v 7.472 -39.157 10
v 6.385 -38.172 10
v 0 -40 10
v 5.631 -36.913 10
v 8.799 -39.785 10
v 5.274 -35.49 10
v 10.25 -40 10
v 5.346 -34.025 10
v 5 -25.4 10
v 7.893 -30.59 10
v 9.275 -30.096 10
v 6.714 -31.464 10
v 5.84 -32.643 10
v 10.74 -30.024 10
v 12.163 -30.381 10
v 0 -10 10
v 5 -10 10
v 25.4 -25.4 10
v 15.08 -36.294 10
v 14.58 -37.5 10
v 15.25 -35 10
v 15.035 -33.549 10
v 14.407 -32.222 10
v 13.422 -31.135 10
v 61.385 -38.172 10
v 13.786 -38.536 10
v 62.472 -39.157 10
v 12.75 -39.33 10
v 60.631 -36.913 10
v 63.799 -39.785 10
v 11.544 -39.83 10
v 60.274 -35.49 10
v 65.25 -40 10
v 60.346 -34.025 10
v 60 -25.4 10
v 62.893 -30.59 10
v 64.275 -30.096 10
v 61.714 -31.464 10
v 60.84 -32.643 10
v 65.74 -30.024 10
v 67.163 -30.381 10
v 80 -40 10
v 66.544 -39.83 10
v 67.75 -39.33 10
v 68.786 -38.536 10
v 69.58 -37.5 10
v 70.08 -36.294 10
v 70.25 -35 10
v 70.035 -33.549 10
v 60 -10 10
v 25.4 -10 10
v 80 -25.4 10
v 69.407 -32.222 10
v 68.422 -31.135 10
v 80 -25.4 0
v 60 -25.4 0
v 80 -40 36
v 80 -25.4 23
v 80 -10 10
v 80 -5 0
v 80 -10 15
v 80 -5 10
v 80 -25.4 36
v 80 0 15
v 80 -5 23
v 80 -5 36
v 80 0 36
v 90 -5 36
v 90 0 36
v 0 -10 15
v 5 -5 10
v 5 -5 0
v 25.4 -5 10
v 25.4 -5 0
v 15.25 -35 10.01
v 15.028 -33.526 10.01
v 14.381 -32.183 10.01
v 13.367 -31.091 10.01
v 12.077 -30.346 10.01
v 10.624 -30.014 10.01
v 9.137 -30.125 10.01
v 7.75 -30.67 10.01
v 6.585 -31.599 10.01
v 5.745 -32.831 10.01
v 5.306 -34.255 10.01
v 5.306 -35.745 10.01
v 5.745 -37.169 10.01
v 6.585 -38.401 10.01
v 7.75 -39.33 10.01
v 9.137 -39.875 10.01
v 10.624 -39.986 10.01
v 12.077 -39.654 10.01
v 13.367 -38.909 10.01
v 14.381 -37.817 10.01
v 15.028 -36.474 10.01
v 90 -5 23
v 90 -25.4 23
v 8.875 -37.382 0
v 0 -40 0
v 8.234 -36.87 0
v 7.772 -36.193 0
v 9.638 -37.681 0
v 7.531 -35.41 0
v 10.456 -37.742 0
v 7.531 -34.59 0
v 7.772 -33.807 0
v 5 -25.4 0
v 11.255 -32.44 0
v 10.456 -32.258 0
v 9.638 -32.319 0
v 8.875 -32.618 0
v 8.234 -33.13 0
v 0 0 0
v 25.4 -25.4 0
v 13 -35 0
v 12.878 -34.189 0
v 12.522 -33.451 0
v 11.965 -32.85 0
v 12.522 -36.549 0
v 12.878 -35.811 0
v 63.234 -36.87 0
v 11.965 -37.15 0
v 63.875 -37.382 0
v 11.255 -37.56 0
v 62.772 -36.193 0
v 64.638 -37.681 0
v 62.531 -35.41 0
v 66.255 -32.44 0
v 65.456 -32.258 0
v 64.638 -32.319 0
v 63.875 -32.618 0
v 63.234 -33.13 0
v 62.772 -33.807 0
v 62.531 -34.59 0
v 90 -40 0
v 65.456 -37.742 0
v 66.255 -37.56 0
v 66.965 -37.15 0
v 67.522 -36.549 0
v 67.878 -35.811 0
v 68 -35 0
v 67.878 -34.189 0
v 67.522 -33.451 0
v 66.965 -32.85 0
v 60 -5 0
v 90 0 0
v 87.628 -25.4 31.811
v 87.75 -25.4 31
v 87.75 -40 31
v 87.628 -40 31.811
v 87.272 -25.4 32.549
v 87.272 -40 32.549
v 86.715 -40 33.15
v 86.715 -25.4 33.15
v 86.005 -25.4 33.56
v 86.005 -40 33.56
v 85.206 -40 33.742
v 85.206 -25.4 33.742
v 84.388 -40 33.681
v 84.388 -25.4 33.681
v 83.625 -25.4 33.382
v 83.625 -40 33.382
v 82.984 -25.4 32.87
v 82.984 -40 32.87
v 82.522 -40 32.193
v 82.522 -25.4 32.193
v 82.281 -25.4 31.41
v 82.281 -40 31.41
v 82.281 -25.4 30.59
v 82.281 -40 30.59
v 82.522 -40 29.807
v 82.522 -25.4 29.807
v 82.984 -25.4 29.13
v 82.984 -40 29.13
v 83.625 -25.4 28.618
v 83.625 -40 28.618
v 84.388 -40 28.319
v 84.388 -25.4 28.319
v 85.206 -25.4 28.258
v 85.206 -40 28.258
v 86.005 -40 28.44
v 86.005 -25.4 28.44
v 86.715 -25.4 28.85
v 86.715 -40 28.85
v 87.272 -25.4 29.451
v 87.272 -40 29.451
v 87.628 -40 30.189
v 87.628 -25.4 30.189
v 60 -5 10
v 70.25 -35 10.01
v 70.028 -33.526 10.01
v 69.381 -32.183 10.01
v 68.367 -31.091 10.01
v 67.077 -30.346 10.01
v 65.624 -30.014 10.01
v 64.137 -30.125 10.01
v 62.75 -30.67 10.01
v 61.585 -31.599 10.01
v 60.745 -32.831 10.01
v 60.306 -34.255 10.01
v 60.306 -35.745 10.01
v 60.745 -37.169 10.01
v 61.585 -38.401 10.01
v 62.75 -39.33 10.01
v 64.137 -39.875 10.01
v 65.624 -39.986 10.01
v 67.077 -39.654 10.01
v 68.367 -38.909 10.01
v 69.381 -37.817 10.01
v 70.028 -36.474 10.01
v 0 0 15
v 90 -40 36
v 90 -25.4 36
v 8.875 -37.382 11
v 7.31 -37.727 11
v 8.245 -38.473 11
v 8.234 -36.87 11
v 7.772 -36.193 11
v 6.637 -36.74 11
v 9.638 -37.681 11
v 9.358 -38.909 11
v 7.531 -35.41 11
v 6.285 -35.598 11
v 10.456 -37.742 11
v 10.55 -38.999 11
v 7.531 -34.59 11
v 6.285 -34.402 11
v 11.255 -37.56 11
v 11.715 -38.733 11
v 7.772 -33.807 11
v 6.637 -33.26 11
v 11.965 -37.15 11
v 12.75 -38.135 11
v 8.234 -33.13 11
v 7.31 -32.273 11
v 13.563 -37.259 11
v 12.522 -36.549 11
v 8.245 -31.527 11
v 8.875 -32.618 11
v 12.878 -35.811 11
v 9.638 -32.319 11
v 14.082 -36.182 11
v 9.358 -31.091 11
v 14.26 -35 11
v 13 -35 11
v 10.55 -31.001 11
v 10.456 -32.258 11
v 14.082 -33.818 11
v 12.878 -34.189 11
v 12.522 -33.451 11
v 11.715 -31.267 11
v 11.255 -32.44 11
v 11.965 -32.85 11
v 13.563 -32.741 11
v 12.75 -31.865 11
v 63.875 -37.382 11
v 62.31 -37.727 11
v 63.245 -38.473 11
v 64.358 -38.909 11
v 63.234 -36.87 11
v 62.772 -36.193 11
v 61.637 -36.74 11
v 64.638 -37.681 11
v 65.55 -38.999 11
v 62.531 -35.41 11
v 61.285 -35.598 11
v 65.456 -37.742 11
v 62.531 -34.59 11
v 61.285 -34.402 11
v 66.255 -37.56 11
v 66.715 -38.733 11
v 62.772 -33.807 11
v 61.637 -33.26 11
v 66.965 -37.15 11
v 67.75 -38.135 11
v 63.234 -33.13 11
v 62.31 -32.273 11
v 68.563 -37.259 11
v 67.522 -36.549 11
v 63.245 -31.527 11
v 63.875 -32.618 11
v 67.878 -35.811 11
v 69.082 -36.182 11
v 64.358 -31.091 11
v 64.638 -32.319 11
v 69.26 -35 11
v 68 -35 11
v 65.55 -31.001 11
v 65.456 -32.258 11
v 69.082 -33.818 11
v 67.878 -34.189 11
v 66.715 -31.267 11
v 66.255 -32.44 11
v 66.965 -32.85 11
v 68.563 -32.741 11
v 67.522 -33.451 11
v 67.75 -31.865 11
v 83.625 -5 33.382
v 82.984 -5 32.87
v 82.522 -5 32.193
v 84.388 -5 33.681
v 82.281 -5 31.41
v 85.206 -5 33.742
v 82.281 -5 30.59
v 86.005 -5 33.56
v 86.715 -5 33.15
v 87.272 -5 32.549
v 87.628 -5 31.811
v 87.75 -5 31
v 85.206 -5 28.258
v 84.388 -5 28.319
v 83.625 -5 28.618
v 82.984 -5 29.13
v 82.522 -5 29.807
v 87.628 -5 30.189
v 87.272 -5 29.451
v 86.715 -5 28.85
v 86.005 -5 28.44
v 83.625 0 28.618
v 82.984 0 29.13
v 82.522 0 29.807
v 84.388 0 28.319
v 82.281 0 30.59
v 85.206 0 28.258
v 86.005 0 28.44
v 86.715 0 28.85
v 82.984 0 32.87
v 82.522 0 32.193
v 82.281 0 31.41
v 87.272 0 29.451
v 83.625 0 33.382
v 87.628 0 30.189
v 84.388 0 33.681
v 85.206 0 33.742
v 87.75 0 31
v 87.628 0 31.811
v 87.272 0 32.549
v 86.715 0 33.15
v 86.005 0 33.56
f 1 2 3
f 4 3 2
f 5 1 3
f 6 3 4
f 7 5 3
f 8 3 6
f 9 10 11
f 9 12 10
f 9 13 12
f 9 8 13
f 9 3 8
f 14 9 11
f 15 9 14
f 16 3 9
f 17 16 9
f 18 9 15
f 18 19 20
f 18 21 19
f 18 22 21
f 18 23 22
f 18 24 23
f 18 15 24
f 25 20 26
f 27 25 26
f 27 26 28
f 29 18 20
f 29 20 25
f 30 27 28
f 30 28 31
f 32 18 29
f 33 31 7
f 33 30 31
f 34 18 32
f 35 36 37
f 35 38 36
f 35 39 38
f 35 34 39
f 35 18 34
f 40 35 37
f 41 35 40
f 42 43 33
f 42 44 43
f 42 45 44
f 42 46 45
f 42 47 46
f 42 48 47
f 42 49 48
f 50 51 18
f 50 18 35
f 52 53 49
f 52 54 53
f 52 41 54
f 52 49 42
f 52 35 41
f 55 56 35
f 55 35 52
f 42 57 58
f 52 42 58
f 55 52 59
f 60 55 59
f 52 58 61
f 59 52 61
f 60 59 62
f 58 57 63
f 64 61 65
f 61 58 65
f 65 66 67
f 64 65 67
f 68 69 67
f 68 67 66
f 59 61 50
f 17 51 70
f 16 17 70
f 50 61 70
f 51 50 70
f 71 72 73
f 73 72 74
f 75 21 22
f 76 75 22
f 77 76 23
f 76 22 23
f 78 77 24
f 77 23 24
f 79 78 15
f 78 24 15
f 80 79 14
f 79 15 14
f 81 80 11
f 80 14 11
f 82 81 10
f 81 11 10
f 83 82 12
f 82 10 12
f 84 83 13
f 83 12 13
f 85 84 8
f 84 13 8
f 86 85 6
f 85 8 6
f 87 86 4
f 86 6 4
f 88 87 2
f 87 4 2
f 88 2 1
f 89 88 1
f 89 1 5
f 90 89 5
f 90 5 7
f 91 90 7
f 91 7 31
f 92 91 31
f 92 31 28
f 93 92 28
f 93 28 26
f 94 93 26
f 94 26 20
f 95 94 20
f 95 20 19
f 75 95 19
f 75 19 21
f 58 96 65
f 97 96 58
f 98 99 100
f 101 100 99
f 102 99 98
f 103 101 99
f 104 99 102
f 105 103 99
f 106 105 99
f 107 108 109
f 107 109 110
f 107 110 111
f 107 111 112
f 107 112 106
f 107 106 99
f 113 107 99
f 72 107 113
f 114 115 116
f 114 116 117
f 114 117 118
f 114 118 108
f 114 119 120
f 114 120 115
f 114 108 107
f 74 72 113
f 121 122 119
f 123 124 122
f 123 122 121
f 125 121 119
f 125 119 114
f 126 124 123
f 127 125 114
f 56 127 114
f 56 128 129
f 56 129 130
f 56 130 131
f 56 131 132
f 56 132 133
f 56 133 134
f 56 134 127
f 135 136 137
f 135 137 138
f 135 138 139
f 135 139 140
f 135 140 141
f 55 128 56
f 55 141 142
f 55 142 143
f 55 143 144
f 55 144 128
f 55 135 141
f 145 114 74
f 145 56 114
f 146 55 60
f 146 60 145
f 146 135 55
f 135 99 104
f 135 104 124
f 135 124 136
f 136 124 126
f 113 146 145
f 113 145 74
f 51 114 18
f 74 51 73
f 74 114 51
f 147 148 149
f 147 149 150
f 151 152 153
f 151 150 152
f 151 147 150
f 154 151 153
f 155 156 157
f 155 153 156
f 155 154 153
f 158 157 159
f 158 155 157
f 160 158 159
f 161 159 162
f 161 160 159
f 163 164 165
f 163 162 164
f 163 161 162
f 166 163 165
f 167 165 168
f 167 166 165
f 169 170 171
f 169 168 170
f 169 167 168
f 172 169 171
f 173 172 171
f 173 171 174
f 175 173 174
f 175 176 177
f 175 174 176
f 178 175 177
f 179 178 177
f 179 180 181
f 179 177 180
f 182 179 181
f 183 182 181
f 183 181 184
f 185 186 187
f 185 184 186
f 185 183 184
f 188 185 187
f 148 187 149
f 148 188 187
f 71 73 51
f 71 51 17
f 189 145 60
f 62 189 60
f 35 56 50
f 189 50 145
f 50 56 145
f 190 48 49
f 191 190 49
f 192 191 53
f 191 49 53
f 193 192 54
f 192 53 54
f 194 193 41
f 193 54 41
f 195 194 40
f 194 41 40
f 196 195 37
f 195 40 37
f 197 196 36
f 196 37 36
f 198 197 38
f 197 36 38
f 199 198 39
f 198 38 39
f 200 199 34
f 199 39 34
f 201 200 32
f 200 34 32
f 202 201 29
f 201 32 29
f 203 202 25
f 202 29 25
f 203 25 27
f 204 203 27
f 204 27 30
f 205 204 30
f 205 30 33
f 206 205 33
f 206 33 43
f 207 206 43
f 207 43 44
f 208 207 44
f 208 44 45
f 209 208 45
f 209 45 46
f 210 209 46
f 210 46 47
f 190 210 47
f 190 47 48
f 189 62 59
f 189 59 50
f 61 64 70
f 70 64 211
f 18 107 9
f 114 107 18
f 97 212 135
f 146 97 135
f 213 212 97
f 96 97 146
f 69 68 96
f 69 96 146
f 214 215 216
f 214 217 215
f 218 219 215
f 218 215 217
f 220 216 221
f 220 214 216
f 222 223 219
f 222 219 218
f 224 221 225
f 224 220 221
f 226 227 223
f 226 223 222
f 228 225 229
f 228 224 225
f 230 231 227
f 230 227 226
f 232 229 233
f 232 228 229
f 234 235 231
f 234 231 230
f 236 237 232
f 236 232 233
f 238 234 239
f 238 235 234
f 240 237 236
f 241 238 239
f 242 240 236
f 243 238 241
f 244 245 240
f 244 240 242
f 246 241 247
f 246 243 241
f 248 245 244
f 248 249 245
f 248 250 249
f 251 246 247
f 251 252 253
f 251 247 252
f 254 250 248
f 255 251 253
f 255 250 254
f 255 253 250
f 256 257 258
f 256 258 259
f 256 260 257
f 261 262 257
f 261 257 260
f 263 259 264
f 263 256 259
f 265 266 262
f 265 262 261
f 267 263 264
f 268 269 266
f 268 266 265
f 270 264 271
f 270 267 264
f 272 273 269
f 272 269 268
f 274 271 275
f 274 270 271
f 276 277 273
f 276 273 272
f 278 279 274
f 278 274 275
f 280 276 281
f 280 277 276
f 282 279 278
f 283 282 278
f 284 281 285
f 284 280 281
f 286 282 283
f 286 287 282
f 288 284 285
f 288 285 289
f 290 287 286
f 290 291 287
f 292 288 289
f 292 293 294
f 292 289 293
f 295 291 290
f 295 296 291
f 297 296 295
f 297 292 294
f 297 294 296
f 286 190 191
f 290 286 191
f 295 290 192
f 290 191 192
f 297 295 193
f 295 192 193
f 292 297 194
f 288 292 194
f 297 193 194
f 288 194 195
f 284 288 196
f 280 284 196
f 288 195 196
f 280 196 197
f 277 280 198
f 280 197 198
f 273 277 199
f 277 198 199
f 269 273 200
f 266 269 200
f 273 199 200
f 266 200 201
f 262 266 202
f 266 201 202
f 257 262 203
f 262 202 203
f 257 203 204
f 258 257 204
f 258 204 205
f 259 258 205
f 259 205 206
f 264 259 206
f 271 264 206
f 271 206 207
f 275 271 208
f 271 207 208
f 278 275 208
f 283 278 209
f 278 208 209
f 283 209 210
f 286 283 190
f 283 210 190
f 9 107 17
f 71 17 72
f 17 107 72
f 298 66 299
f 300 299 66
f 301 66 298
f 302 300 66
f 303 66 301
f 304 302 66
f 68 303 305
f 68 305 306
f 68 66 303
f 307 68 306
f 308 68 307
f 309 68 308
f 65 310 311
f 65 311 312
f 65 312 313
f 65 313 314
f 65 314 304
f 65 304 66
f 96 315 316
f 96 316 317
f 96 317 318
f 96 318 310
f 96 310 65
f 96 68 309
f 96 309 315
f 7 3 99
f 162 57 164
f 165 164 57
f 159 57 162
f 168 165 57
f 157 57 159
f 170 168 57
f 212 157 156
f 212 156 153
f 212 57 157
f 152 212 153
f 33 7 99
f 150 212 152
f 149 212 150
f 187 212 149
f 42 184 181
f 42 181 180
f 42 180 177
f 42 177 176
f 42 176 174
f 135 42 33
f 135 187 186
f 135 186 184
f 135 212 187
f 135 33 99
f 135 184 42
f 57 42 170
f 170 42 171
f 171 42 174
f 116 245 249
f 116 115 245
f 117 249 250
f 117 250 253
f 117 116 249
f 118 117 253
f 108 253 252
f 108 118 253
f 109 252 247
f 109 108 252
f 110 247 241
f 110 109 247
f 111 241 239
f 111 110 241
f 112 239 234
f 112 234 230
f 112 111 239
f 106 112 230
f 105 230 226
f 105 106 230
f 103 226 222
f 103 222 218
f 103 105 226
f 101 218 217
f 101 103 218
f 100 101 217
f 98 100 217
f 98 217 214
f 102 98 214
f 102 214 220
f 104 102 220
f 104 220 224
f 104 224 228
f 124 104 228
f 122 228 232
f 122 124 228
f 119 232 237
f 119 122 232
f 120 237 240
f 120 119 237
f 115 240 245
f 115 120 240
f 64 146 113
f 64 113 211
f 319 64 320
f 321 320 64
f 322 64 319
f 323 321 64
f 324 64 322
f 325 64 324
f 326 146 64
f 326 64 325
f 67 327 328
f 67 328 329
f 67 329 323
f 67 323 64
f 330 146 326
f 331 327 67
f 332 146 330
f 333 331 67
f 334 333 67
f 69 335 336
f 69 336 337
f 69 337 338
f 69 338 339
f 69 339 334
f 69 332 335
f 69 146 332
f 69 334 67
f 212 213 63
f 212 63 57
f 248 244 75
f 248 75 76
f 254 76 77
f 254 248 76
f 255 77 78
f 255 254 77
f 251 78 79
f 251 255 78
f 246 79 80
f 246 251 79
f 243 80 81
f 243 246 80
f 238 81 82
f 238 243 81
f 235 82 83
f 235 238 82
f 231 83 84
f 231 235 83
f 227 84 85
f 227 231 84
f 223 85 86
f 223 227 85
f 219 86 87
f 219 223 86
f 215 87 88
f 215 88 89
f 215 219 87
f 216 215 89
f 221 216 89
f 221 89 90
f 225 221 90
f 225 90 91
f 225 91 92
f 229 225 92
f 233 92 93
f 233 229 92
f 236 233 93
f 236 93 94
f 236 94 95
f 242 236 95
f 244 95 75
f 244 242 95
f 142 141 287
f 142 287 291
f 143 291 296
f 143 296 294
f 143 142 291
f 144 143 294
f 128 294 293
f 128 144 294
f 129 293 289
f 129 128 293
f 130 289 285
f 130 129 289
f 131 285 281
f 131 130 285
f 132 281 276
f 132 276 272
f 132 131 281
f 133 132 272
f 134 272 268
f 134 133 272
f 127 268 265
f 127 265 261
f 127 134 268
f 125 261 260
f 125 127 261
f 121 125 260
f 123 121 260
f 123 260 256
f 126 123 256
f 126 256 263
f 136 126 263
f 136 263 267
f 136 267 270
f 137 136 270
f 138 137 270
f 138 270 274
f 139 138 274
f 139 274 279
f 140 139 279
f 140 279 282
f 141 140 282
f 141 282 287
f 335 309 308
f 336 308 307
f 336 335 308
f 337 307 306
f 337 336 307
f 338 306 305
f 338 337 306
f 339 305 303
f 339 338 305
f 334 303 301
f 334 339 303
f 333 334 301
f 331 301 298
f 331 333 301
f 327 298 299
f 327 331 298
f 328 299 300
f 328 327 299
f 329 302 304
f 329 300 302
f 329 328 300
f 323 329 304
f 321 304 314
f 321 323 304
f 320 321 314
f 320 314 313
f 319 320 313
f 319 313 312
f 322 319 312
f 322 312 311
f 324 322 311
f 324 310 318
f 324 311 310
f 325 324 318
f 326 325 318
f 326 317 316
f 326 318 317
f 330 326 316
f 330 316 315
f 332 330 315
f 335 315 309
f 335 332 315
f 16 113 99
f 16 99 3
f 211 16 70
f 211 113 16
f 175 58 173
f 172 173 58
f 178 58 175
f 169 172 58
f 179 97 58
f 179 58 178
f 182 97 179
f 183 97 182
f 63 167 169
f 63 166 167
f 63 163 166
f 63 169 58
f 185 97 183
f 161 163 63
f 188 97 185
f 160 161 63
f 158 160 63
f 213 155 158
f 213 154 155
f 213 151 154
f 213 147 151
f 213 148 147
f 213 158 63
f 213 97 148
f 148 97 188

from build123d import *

# Parameters (mm, degrees)
SKETCH_W      = 90
SKETCH_H      = 40
SKETCH_W_2    = 20.4
SKETCH_H_2    = 20.4
PAD_DEPTH     = 10
PAD001_DEPTH  = 10
SKETCH002_R   = 2.75
HOLE_DEPTH    = 40.001
SKETCH003_R   = 2.75
HOLE001_DEPTH = 36.001
SKETCH004_W   = 80
SKETCH004_H   = 5
PAD002_DEPTH  = 10
SKETCH005_R   = 5
SKETCH005_R_2 = 2.75
PAD003_DEPTH  = 1
CHAMFER_SIZE  = 0.99


with BuildPart() as part:
    # Sketch → Pad (new body)
    with BuildSketch(Plane.XY):
        with Locations((45, -20)):
            Rectangle(SKETCH_W, SKETCH_H)
        with Locations((15.2, -15.2)):
            Rectangle(SKETCH_W_2, SKETCH_H_2, mode=Mode.SUBTRACT)
        with Locations((70.2, -15.2)):
            Rectangle(SKETCH_W_2, SKETCH_H_2, mode=Mode.SUBTRACT)
    extrude(amount=PAD_DEPTH)

    # Sketch001 (on Face2 of Pad) → Pad001 (join)
    with BuildSketch(Plane.YZ.offset(90)):
        Polygon((0, 36), (-5, 36), (-5, 23), (-25.4, 23), (-25.4, 36), (-40, 36), (-40, 0), (0, 0), align=None)
    extrude(amount=-PAD001_DEPTH)

    # Sketch002 → Hole (cut, through all)
    with BuildSketch(Plane.XZ):
        with Locations((85, 31)):
            Circle(SKETCH002_R)
    extrude(amount=HOLE_DEPTH, mode=Mode.SUBTRACT)

    # Sketch003 → Hole001 (cut, through all)
    with BuildSketch(Plane.XY):
        with Locations((10.25, -35)):
            Circle(SKETCH003_R)
        with Locations((65.25, -35)):
            Circle(SKETCH003_R)
    extrude(amount=HOLE001_DEPTH, mode=Mode.SUBTRACT)

    # Sketch004 (on Face1 of Hole001) → Pad002 (join)
    with BuildSketch(Plane(origin=(0, 0, 0), x_dir=(-1, 0, 0), z_dir=(0, 1, 0))):
        with Locations((-40, 12.5)):
            Rectangle(SKETCH004_W, SKETCH004_H)
    extrude(amount=-PAD002_DEPTH)

    # Sketch005 → Pad003 (join)
    with BuildSketch(Plane.XY.offset(10)):
        with Locations((10.25, -35)):
            Circle(SKETCH005_R)
        with Locations((10.25, -35)):
            Circle(SKETCH005_R_2, mode=Mode.SUBTRACT)
        with Locations((65.25, -35)):
            Circle(SKETCH005_R)
        with Locations((65.25, -35)):
            Circle(SKETCH005_R_2, mode=Mode.SUBTRACT)
    extrude(amount=PAD003_DEPTH)

    # Chamfer
    chamfer_edges = [part.edges().sort_by_distance(p)[0] for p in [
        (5.25, -35, 11),
        (60.25, -35, 11),
    ]]
    chamfer(chamfer_edges, length=CHAMFER_SIZE)


solid = part.part
